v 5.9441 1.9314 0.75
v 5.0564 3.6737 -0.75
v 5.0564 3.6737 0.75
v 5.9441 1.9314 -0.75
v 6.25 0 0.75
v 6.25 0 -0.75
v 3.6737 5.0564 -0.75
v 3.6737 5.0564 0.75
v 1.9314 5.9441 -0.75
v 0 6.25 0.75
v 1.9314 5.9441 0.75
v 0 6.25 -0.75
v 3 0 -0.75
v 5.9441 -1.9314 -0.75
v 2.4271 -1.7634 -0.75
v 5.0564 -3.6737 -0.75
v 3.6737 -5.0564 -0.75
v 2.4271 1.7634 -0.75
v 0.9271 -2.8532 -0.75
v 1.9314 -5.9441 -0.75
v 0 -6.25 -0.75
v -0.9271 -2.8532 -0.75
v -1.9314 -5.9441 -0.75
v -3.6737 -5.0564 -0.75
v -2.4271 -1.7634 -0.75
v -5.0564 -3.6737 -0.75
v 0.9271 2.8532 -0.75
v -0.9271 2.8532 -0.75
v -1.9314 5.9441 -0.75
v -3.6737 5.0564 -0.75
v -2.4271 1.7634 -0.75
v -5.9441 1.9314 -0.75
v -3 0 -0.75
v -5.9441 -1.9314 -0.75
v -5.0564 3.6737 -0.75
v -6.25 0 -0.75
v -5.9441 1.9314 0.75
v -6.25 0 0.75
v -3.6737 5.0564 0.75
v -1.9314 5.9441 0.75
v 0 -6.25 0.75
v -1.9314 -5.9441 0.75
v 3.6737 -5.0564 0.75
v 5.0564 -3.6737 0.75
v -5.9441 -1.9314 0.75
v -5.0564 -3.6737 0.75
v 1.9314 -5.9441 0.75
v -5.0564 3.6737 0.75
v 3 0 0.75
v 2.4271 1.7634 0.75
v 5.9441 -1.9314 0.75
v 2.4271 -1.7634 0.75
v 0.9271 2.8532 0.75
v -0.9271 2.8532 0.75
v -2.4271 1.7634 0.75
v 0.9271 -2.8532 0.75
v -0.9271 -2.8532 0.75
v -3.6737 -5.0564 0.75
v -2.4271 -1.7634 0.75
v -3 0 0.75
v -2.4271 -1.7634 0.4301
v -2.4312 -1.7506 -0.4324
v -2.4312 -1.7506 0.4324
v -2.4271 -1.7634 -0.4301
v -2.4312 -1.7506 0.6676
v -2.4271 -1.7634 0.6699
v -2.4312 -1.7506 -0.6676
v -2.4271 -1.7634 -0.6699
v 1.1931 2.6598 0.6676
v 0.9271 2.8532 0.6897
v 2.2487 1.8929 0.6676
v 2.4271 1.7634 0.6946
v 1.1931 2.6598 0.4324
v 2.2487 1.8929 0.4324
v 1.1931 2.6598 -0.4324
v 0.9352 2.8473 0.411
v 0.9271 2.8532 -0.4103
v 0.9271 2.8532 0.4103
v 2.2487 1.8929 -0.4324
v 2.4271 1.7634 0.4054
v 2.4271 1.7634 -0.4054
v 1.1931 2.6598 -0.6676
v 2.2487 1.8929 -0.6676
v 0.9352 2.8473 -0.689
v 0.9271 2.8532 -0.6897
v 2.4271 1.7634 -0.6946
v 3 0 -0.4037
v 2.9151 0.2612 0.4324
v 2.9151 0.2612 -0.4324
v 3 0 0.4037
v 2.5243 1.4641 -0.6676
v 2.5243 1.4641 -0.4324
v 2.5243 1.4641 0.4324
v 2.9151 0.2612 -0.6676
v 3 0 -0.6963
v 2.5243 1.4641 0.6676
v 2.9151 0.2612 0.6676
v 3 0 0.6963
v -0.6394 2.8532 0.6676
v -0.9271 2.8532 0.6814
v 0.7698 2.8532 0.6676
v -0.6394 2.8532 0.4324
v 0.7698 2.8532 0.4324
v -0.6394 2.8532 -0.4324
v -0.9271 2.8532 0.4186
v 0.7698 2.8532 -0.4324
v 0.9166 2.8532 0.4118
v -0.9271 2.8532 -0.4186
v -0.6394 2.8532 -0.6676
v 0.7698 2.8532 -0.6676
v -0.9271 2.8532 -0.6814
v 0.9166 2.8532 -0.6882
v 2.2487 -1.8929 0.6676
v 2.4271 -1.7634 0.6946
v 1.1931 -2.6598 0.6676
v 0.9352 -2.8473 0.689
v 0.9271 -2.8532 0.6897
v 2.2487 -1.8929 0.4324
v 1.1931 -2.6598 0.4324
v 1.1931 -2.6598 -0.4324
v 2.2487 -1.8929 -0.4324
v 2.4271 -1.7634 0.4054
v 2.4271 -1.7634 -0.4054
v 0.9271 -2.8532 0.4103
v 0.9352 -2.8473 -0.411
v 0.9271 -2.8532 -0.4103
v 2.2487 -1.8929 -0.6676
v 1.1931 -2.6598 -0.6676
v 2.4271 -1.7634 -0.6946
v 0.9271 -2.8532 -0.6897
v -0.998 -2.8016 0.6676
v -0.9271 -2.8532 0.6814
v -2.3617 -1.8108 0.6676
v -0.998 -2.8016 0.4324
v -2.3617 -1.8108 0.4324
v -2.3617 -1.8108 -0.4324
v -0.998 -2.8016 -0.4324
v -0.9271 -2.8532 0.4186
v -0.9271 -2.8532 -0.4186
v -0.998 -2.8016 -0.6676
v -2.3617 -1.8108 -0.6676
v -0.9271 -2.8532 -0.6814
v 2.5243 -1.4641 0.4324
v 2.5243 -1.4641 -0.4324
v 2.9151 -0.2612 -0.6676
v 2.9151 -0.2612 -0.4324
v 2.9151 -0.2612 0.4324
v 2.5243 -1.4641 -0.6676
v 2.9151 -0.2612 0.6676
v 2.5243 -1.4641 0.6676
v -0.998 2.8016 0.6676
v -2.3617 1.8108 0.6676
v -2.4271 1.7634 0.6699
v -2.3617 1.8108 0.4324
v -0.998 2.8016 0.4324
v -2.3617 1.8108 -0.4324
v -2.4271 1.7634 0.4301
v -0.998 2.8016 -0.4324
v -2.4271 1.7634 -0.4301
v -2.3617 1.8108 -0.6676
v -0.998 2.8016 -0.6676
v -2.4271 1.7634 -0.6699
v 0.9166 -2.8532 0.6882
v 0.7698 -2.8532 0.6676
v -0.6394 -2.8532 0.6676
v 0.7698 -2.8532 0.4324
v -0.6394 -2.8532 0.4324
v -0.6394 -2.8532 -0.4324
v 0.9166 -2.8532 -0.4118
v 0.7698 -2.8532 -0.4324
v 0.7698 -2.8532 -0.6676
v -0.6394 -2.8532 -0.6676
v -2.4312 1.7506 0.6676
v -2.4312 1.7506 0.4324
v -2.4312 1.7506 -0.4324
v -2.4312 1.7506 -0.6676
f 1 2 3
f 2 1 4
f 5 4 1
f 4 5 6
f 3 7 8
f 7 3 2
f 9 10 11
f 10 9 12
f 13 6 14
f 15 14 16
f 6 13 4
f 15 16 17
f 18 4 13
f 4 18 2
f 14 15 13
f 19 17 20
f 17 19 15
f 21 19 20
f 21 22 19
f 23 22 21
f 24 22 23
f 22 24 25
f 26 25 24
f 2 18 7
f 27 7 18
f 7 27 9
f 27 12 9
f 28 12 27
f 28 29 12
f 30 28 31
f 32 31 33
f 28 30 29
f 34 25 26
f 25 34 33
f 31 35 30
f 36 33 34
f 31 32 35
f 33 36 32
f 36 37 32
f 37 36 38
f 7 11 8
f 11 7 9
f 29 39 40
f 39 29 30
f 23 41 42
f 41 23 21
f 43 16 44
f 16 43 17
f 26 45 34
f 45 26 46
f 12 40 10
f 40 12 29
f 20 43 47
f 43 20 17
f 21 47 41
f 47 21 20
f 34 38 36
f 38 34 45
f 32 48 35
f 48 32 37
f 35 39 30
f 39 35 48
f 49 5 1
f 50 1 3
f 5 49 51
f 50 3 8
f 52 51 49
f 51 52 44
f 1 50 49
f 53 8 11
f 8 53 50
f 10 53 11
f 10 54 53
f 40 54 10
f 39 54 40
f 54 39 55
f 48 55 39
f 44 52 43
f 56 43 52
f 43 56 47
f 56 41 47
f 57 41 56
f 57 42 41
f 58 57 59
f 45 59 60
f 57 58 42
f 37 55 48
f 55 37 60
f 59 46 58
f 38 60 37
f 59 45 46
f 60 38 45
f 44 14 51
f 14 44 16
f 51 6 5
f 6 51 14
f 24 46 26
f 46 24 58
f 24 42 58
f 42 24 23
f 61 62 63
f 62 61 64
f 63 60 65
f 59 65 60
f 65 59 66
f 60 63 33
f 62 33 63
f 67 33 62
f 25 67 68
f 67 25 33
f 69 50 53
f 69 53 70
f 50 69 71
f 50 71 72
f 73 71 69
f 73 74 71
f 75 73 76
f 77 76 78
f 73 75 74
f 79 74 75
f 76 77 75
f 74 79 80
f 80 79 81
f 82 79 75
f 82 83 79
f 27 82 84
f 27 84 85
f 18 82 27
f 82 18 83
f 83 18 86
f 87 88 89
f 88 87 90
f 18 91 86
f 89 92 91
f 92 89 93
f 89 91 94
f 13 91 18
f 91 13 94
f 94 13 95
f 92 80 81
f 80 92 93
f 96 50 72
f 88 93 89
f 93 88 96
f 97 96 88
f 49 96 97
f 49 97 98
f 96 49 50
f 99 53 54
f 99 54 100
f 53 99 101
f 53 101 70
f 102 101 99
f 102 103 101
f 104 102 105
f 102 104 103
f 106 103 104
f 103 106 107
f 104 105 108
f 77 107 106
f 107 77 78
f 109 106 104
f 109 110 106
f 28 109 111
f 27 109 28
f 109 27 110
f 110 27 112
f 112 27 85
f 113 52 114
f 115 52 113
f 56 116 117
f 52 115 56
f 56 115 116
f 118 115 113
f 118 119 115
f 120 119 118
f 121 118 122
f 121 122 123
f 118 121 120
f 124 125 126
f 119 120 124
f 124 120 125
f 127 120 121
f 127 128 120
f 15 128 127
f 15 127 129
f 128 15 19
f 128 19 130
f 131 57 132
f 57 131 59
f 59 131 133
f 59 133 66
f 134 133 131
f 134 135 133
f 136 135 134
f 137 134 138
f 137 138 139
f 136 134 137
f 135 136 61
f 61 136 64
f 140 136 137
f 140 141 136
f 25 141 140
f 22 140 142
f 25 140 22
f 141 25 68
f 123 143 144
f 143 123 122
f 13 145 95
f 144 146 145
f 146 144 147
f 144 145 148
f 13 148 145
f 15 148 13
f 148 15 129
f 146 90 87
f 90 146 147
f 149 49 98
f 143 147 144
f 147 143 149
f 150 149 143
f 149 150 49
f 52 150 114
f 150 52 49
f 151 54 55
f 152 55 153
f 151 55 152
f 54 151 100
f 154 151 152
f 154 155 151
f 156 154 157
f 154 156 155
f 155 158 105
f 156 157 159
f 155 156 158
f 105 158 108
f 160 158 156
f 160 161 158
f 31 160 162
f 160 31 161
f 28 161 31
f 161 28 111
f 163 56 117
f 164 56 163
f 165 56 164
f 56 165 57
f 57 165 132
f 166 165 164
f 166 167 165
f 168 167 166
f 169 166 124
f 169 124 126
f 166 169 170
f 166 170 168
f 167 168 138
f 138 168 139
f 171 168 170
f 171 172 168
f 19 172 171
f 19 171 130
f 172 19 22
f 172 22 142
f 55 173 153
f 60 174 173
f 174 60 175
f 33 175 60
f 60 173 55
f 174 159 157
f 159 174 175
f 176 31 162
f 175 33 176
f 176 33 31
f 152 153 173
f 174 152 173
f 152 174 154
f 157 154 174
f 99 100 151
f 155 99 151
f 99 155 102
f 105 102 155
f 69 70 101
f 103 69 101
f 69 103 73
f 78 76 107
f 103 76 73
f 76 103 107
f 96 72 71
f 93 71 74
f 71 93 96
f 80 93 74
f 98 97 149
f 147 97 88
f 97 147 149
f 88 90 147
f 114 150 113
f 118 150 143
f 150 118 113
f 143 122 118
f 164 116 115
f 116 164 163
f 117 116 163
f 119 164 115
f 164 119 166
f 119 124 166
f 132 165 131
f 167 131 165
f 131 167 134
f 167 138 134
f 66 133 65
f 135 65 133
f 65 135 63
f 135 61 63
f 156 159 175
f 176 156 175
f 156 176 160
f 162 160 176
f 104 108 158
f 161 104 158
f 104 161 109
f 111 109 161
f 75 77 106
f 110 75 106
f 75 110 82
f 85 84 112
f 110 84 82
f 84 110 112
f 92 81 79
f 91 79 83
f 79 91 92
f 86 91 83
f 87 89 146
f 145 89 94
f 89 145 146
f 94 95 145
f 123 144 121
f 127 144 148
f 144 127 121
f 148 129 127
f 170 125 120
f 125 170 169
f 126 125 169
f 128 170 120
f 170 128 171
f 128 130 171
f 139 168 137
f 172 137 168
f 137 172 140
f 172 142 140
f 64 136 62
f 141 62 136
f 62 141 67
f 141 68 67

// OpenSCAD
// Parameters
outer_diameter = 12.5; //[6.25:25:0.1]
inner_diameter = 6; //[3:12:0.1]
thickness = 1.5; //[0.75:3:0.1]
edge_chamfer = 0.3; //[0:1.5:0.05]
edge_fillet = 0.2; //[0:1:0.05]
overlap = 0.8; //[0.2:2:0.1]

// Washer Body
module washer_body() {
  cylinder(h=thickness, r=outer_diameter/2, center=true);
}

// Center Through Hole
module center_through_hole() {
  cylinder(h=thickness + 2*overlap, r=inner_diameter/2, center=true);
}

// Outer Chamfers
module outer_chamfer_top() {
  translate([0, 0, thickness/2 - edge_chamfer/2 + overlap/2])
    cylinder(h=edge_chamfer, r1=outer_diameter/2 + overlap, r2=0, center=true);
}

module outer_chamfer_bottom() {
  translate([0, 0, -thickness/2 + edge_chamfer/2 - overlap/2])
    rotate([180, 0, 0])
    cylinder(h=edge_chamfer, r1=outer_diameter/2 + overlap, r2=0, center=true);
}

// Inner Chamfers
module inner_chamfer_top() {
  translate([0, 0, thickness/2 - edge_chamfer/2 + overlap/2])
    cylinder(h=edge_chamfer, r1=inner_diameter/2 + edge_chamfer + overlap, r2=0, center=true);
}

module inner_chamfer_bottom() {
  translate([0, 0, -thickness/2 + edge_chamfer/2 - overlap/2])
    rotate([180, 0, 0])
    cylinder(h=edge_chamfer, r1=inner_diameter/2 + edge_chamfer + overlap, r2=0, center=true);
}

// Outer Fillet Torus
module outer_fillet_torus_top() {
  translate([0, 0, thickness/2 - edge_fillet])
    rotate_extrude()
    translate([outer_diameter/2 - edge_fillet, 0, 0])
    circle(r=edge_fillet);
}

module outer_fillet_torus_bottom() {
  translate([0, 0, -thickness/2 + edge_fillet])
    rotate_extrude()
    translate([outer_diameter/2 - edge_fillet, 0, 0])
    circle(r=edge_fillet);
}

// Inner Fillet Torus
module inner_fillet_torus_top() {
  translate([0, 0, thickness/2 - edge_fillet])
    rotate_extrude()
    translate([inner_diameter/2 + edge_fillet, 0, 0])
    circle(r=edge_fillet);
}

module inner_fillet_torus_bottom() {
  translate([0, 0, -thickness/2 + edge_fillet])
    rotate_extrude()
    translate([inner_diameter/2 + edge_fillet, 0, 0])
    circle(r=edge_fillet);
}

// Edge Chamfers
module edge_chamfers() {
  union() {
    outer_chamfer_top();
    outer_chamfer_bottom();
    inner_chamfer_top();
    inner_chamfer_bottom();
  }
}

// Edge Fillets
module edge_fillets() {
  union() {
    outer_fillet_torus_top();
    outer_fillet_torus_bottom();
    inner_fillet_torus_top();
    inner_fillet_torus_bottom();
  }
}

// Final Washer with Fillets
module washer_with_fillets() {
  union() {
    difference() {
      difference() {
        washer_body();
        center_through_hole();
      }
      edge_chamfers();
    }
    edge_fillets();
  }
}

// Render the final washer
washer_with_fillets();
